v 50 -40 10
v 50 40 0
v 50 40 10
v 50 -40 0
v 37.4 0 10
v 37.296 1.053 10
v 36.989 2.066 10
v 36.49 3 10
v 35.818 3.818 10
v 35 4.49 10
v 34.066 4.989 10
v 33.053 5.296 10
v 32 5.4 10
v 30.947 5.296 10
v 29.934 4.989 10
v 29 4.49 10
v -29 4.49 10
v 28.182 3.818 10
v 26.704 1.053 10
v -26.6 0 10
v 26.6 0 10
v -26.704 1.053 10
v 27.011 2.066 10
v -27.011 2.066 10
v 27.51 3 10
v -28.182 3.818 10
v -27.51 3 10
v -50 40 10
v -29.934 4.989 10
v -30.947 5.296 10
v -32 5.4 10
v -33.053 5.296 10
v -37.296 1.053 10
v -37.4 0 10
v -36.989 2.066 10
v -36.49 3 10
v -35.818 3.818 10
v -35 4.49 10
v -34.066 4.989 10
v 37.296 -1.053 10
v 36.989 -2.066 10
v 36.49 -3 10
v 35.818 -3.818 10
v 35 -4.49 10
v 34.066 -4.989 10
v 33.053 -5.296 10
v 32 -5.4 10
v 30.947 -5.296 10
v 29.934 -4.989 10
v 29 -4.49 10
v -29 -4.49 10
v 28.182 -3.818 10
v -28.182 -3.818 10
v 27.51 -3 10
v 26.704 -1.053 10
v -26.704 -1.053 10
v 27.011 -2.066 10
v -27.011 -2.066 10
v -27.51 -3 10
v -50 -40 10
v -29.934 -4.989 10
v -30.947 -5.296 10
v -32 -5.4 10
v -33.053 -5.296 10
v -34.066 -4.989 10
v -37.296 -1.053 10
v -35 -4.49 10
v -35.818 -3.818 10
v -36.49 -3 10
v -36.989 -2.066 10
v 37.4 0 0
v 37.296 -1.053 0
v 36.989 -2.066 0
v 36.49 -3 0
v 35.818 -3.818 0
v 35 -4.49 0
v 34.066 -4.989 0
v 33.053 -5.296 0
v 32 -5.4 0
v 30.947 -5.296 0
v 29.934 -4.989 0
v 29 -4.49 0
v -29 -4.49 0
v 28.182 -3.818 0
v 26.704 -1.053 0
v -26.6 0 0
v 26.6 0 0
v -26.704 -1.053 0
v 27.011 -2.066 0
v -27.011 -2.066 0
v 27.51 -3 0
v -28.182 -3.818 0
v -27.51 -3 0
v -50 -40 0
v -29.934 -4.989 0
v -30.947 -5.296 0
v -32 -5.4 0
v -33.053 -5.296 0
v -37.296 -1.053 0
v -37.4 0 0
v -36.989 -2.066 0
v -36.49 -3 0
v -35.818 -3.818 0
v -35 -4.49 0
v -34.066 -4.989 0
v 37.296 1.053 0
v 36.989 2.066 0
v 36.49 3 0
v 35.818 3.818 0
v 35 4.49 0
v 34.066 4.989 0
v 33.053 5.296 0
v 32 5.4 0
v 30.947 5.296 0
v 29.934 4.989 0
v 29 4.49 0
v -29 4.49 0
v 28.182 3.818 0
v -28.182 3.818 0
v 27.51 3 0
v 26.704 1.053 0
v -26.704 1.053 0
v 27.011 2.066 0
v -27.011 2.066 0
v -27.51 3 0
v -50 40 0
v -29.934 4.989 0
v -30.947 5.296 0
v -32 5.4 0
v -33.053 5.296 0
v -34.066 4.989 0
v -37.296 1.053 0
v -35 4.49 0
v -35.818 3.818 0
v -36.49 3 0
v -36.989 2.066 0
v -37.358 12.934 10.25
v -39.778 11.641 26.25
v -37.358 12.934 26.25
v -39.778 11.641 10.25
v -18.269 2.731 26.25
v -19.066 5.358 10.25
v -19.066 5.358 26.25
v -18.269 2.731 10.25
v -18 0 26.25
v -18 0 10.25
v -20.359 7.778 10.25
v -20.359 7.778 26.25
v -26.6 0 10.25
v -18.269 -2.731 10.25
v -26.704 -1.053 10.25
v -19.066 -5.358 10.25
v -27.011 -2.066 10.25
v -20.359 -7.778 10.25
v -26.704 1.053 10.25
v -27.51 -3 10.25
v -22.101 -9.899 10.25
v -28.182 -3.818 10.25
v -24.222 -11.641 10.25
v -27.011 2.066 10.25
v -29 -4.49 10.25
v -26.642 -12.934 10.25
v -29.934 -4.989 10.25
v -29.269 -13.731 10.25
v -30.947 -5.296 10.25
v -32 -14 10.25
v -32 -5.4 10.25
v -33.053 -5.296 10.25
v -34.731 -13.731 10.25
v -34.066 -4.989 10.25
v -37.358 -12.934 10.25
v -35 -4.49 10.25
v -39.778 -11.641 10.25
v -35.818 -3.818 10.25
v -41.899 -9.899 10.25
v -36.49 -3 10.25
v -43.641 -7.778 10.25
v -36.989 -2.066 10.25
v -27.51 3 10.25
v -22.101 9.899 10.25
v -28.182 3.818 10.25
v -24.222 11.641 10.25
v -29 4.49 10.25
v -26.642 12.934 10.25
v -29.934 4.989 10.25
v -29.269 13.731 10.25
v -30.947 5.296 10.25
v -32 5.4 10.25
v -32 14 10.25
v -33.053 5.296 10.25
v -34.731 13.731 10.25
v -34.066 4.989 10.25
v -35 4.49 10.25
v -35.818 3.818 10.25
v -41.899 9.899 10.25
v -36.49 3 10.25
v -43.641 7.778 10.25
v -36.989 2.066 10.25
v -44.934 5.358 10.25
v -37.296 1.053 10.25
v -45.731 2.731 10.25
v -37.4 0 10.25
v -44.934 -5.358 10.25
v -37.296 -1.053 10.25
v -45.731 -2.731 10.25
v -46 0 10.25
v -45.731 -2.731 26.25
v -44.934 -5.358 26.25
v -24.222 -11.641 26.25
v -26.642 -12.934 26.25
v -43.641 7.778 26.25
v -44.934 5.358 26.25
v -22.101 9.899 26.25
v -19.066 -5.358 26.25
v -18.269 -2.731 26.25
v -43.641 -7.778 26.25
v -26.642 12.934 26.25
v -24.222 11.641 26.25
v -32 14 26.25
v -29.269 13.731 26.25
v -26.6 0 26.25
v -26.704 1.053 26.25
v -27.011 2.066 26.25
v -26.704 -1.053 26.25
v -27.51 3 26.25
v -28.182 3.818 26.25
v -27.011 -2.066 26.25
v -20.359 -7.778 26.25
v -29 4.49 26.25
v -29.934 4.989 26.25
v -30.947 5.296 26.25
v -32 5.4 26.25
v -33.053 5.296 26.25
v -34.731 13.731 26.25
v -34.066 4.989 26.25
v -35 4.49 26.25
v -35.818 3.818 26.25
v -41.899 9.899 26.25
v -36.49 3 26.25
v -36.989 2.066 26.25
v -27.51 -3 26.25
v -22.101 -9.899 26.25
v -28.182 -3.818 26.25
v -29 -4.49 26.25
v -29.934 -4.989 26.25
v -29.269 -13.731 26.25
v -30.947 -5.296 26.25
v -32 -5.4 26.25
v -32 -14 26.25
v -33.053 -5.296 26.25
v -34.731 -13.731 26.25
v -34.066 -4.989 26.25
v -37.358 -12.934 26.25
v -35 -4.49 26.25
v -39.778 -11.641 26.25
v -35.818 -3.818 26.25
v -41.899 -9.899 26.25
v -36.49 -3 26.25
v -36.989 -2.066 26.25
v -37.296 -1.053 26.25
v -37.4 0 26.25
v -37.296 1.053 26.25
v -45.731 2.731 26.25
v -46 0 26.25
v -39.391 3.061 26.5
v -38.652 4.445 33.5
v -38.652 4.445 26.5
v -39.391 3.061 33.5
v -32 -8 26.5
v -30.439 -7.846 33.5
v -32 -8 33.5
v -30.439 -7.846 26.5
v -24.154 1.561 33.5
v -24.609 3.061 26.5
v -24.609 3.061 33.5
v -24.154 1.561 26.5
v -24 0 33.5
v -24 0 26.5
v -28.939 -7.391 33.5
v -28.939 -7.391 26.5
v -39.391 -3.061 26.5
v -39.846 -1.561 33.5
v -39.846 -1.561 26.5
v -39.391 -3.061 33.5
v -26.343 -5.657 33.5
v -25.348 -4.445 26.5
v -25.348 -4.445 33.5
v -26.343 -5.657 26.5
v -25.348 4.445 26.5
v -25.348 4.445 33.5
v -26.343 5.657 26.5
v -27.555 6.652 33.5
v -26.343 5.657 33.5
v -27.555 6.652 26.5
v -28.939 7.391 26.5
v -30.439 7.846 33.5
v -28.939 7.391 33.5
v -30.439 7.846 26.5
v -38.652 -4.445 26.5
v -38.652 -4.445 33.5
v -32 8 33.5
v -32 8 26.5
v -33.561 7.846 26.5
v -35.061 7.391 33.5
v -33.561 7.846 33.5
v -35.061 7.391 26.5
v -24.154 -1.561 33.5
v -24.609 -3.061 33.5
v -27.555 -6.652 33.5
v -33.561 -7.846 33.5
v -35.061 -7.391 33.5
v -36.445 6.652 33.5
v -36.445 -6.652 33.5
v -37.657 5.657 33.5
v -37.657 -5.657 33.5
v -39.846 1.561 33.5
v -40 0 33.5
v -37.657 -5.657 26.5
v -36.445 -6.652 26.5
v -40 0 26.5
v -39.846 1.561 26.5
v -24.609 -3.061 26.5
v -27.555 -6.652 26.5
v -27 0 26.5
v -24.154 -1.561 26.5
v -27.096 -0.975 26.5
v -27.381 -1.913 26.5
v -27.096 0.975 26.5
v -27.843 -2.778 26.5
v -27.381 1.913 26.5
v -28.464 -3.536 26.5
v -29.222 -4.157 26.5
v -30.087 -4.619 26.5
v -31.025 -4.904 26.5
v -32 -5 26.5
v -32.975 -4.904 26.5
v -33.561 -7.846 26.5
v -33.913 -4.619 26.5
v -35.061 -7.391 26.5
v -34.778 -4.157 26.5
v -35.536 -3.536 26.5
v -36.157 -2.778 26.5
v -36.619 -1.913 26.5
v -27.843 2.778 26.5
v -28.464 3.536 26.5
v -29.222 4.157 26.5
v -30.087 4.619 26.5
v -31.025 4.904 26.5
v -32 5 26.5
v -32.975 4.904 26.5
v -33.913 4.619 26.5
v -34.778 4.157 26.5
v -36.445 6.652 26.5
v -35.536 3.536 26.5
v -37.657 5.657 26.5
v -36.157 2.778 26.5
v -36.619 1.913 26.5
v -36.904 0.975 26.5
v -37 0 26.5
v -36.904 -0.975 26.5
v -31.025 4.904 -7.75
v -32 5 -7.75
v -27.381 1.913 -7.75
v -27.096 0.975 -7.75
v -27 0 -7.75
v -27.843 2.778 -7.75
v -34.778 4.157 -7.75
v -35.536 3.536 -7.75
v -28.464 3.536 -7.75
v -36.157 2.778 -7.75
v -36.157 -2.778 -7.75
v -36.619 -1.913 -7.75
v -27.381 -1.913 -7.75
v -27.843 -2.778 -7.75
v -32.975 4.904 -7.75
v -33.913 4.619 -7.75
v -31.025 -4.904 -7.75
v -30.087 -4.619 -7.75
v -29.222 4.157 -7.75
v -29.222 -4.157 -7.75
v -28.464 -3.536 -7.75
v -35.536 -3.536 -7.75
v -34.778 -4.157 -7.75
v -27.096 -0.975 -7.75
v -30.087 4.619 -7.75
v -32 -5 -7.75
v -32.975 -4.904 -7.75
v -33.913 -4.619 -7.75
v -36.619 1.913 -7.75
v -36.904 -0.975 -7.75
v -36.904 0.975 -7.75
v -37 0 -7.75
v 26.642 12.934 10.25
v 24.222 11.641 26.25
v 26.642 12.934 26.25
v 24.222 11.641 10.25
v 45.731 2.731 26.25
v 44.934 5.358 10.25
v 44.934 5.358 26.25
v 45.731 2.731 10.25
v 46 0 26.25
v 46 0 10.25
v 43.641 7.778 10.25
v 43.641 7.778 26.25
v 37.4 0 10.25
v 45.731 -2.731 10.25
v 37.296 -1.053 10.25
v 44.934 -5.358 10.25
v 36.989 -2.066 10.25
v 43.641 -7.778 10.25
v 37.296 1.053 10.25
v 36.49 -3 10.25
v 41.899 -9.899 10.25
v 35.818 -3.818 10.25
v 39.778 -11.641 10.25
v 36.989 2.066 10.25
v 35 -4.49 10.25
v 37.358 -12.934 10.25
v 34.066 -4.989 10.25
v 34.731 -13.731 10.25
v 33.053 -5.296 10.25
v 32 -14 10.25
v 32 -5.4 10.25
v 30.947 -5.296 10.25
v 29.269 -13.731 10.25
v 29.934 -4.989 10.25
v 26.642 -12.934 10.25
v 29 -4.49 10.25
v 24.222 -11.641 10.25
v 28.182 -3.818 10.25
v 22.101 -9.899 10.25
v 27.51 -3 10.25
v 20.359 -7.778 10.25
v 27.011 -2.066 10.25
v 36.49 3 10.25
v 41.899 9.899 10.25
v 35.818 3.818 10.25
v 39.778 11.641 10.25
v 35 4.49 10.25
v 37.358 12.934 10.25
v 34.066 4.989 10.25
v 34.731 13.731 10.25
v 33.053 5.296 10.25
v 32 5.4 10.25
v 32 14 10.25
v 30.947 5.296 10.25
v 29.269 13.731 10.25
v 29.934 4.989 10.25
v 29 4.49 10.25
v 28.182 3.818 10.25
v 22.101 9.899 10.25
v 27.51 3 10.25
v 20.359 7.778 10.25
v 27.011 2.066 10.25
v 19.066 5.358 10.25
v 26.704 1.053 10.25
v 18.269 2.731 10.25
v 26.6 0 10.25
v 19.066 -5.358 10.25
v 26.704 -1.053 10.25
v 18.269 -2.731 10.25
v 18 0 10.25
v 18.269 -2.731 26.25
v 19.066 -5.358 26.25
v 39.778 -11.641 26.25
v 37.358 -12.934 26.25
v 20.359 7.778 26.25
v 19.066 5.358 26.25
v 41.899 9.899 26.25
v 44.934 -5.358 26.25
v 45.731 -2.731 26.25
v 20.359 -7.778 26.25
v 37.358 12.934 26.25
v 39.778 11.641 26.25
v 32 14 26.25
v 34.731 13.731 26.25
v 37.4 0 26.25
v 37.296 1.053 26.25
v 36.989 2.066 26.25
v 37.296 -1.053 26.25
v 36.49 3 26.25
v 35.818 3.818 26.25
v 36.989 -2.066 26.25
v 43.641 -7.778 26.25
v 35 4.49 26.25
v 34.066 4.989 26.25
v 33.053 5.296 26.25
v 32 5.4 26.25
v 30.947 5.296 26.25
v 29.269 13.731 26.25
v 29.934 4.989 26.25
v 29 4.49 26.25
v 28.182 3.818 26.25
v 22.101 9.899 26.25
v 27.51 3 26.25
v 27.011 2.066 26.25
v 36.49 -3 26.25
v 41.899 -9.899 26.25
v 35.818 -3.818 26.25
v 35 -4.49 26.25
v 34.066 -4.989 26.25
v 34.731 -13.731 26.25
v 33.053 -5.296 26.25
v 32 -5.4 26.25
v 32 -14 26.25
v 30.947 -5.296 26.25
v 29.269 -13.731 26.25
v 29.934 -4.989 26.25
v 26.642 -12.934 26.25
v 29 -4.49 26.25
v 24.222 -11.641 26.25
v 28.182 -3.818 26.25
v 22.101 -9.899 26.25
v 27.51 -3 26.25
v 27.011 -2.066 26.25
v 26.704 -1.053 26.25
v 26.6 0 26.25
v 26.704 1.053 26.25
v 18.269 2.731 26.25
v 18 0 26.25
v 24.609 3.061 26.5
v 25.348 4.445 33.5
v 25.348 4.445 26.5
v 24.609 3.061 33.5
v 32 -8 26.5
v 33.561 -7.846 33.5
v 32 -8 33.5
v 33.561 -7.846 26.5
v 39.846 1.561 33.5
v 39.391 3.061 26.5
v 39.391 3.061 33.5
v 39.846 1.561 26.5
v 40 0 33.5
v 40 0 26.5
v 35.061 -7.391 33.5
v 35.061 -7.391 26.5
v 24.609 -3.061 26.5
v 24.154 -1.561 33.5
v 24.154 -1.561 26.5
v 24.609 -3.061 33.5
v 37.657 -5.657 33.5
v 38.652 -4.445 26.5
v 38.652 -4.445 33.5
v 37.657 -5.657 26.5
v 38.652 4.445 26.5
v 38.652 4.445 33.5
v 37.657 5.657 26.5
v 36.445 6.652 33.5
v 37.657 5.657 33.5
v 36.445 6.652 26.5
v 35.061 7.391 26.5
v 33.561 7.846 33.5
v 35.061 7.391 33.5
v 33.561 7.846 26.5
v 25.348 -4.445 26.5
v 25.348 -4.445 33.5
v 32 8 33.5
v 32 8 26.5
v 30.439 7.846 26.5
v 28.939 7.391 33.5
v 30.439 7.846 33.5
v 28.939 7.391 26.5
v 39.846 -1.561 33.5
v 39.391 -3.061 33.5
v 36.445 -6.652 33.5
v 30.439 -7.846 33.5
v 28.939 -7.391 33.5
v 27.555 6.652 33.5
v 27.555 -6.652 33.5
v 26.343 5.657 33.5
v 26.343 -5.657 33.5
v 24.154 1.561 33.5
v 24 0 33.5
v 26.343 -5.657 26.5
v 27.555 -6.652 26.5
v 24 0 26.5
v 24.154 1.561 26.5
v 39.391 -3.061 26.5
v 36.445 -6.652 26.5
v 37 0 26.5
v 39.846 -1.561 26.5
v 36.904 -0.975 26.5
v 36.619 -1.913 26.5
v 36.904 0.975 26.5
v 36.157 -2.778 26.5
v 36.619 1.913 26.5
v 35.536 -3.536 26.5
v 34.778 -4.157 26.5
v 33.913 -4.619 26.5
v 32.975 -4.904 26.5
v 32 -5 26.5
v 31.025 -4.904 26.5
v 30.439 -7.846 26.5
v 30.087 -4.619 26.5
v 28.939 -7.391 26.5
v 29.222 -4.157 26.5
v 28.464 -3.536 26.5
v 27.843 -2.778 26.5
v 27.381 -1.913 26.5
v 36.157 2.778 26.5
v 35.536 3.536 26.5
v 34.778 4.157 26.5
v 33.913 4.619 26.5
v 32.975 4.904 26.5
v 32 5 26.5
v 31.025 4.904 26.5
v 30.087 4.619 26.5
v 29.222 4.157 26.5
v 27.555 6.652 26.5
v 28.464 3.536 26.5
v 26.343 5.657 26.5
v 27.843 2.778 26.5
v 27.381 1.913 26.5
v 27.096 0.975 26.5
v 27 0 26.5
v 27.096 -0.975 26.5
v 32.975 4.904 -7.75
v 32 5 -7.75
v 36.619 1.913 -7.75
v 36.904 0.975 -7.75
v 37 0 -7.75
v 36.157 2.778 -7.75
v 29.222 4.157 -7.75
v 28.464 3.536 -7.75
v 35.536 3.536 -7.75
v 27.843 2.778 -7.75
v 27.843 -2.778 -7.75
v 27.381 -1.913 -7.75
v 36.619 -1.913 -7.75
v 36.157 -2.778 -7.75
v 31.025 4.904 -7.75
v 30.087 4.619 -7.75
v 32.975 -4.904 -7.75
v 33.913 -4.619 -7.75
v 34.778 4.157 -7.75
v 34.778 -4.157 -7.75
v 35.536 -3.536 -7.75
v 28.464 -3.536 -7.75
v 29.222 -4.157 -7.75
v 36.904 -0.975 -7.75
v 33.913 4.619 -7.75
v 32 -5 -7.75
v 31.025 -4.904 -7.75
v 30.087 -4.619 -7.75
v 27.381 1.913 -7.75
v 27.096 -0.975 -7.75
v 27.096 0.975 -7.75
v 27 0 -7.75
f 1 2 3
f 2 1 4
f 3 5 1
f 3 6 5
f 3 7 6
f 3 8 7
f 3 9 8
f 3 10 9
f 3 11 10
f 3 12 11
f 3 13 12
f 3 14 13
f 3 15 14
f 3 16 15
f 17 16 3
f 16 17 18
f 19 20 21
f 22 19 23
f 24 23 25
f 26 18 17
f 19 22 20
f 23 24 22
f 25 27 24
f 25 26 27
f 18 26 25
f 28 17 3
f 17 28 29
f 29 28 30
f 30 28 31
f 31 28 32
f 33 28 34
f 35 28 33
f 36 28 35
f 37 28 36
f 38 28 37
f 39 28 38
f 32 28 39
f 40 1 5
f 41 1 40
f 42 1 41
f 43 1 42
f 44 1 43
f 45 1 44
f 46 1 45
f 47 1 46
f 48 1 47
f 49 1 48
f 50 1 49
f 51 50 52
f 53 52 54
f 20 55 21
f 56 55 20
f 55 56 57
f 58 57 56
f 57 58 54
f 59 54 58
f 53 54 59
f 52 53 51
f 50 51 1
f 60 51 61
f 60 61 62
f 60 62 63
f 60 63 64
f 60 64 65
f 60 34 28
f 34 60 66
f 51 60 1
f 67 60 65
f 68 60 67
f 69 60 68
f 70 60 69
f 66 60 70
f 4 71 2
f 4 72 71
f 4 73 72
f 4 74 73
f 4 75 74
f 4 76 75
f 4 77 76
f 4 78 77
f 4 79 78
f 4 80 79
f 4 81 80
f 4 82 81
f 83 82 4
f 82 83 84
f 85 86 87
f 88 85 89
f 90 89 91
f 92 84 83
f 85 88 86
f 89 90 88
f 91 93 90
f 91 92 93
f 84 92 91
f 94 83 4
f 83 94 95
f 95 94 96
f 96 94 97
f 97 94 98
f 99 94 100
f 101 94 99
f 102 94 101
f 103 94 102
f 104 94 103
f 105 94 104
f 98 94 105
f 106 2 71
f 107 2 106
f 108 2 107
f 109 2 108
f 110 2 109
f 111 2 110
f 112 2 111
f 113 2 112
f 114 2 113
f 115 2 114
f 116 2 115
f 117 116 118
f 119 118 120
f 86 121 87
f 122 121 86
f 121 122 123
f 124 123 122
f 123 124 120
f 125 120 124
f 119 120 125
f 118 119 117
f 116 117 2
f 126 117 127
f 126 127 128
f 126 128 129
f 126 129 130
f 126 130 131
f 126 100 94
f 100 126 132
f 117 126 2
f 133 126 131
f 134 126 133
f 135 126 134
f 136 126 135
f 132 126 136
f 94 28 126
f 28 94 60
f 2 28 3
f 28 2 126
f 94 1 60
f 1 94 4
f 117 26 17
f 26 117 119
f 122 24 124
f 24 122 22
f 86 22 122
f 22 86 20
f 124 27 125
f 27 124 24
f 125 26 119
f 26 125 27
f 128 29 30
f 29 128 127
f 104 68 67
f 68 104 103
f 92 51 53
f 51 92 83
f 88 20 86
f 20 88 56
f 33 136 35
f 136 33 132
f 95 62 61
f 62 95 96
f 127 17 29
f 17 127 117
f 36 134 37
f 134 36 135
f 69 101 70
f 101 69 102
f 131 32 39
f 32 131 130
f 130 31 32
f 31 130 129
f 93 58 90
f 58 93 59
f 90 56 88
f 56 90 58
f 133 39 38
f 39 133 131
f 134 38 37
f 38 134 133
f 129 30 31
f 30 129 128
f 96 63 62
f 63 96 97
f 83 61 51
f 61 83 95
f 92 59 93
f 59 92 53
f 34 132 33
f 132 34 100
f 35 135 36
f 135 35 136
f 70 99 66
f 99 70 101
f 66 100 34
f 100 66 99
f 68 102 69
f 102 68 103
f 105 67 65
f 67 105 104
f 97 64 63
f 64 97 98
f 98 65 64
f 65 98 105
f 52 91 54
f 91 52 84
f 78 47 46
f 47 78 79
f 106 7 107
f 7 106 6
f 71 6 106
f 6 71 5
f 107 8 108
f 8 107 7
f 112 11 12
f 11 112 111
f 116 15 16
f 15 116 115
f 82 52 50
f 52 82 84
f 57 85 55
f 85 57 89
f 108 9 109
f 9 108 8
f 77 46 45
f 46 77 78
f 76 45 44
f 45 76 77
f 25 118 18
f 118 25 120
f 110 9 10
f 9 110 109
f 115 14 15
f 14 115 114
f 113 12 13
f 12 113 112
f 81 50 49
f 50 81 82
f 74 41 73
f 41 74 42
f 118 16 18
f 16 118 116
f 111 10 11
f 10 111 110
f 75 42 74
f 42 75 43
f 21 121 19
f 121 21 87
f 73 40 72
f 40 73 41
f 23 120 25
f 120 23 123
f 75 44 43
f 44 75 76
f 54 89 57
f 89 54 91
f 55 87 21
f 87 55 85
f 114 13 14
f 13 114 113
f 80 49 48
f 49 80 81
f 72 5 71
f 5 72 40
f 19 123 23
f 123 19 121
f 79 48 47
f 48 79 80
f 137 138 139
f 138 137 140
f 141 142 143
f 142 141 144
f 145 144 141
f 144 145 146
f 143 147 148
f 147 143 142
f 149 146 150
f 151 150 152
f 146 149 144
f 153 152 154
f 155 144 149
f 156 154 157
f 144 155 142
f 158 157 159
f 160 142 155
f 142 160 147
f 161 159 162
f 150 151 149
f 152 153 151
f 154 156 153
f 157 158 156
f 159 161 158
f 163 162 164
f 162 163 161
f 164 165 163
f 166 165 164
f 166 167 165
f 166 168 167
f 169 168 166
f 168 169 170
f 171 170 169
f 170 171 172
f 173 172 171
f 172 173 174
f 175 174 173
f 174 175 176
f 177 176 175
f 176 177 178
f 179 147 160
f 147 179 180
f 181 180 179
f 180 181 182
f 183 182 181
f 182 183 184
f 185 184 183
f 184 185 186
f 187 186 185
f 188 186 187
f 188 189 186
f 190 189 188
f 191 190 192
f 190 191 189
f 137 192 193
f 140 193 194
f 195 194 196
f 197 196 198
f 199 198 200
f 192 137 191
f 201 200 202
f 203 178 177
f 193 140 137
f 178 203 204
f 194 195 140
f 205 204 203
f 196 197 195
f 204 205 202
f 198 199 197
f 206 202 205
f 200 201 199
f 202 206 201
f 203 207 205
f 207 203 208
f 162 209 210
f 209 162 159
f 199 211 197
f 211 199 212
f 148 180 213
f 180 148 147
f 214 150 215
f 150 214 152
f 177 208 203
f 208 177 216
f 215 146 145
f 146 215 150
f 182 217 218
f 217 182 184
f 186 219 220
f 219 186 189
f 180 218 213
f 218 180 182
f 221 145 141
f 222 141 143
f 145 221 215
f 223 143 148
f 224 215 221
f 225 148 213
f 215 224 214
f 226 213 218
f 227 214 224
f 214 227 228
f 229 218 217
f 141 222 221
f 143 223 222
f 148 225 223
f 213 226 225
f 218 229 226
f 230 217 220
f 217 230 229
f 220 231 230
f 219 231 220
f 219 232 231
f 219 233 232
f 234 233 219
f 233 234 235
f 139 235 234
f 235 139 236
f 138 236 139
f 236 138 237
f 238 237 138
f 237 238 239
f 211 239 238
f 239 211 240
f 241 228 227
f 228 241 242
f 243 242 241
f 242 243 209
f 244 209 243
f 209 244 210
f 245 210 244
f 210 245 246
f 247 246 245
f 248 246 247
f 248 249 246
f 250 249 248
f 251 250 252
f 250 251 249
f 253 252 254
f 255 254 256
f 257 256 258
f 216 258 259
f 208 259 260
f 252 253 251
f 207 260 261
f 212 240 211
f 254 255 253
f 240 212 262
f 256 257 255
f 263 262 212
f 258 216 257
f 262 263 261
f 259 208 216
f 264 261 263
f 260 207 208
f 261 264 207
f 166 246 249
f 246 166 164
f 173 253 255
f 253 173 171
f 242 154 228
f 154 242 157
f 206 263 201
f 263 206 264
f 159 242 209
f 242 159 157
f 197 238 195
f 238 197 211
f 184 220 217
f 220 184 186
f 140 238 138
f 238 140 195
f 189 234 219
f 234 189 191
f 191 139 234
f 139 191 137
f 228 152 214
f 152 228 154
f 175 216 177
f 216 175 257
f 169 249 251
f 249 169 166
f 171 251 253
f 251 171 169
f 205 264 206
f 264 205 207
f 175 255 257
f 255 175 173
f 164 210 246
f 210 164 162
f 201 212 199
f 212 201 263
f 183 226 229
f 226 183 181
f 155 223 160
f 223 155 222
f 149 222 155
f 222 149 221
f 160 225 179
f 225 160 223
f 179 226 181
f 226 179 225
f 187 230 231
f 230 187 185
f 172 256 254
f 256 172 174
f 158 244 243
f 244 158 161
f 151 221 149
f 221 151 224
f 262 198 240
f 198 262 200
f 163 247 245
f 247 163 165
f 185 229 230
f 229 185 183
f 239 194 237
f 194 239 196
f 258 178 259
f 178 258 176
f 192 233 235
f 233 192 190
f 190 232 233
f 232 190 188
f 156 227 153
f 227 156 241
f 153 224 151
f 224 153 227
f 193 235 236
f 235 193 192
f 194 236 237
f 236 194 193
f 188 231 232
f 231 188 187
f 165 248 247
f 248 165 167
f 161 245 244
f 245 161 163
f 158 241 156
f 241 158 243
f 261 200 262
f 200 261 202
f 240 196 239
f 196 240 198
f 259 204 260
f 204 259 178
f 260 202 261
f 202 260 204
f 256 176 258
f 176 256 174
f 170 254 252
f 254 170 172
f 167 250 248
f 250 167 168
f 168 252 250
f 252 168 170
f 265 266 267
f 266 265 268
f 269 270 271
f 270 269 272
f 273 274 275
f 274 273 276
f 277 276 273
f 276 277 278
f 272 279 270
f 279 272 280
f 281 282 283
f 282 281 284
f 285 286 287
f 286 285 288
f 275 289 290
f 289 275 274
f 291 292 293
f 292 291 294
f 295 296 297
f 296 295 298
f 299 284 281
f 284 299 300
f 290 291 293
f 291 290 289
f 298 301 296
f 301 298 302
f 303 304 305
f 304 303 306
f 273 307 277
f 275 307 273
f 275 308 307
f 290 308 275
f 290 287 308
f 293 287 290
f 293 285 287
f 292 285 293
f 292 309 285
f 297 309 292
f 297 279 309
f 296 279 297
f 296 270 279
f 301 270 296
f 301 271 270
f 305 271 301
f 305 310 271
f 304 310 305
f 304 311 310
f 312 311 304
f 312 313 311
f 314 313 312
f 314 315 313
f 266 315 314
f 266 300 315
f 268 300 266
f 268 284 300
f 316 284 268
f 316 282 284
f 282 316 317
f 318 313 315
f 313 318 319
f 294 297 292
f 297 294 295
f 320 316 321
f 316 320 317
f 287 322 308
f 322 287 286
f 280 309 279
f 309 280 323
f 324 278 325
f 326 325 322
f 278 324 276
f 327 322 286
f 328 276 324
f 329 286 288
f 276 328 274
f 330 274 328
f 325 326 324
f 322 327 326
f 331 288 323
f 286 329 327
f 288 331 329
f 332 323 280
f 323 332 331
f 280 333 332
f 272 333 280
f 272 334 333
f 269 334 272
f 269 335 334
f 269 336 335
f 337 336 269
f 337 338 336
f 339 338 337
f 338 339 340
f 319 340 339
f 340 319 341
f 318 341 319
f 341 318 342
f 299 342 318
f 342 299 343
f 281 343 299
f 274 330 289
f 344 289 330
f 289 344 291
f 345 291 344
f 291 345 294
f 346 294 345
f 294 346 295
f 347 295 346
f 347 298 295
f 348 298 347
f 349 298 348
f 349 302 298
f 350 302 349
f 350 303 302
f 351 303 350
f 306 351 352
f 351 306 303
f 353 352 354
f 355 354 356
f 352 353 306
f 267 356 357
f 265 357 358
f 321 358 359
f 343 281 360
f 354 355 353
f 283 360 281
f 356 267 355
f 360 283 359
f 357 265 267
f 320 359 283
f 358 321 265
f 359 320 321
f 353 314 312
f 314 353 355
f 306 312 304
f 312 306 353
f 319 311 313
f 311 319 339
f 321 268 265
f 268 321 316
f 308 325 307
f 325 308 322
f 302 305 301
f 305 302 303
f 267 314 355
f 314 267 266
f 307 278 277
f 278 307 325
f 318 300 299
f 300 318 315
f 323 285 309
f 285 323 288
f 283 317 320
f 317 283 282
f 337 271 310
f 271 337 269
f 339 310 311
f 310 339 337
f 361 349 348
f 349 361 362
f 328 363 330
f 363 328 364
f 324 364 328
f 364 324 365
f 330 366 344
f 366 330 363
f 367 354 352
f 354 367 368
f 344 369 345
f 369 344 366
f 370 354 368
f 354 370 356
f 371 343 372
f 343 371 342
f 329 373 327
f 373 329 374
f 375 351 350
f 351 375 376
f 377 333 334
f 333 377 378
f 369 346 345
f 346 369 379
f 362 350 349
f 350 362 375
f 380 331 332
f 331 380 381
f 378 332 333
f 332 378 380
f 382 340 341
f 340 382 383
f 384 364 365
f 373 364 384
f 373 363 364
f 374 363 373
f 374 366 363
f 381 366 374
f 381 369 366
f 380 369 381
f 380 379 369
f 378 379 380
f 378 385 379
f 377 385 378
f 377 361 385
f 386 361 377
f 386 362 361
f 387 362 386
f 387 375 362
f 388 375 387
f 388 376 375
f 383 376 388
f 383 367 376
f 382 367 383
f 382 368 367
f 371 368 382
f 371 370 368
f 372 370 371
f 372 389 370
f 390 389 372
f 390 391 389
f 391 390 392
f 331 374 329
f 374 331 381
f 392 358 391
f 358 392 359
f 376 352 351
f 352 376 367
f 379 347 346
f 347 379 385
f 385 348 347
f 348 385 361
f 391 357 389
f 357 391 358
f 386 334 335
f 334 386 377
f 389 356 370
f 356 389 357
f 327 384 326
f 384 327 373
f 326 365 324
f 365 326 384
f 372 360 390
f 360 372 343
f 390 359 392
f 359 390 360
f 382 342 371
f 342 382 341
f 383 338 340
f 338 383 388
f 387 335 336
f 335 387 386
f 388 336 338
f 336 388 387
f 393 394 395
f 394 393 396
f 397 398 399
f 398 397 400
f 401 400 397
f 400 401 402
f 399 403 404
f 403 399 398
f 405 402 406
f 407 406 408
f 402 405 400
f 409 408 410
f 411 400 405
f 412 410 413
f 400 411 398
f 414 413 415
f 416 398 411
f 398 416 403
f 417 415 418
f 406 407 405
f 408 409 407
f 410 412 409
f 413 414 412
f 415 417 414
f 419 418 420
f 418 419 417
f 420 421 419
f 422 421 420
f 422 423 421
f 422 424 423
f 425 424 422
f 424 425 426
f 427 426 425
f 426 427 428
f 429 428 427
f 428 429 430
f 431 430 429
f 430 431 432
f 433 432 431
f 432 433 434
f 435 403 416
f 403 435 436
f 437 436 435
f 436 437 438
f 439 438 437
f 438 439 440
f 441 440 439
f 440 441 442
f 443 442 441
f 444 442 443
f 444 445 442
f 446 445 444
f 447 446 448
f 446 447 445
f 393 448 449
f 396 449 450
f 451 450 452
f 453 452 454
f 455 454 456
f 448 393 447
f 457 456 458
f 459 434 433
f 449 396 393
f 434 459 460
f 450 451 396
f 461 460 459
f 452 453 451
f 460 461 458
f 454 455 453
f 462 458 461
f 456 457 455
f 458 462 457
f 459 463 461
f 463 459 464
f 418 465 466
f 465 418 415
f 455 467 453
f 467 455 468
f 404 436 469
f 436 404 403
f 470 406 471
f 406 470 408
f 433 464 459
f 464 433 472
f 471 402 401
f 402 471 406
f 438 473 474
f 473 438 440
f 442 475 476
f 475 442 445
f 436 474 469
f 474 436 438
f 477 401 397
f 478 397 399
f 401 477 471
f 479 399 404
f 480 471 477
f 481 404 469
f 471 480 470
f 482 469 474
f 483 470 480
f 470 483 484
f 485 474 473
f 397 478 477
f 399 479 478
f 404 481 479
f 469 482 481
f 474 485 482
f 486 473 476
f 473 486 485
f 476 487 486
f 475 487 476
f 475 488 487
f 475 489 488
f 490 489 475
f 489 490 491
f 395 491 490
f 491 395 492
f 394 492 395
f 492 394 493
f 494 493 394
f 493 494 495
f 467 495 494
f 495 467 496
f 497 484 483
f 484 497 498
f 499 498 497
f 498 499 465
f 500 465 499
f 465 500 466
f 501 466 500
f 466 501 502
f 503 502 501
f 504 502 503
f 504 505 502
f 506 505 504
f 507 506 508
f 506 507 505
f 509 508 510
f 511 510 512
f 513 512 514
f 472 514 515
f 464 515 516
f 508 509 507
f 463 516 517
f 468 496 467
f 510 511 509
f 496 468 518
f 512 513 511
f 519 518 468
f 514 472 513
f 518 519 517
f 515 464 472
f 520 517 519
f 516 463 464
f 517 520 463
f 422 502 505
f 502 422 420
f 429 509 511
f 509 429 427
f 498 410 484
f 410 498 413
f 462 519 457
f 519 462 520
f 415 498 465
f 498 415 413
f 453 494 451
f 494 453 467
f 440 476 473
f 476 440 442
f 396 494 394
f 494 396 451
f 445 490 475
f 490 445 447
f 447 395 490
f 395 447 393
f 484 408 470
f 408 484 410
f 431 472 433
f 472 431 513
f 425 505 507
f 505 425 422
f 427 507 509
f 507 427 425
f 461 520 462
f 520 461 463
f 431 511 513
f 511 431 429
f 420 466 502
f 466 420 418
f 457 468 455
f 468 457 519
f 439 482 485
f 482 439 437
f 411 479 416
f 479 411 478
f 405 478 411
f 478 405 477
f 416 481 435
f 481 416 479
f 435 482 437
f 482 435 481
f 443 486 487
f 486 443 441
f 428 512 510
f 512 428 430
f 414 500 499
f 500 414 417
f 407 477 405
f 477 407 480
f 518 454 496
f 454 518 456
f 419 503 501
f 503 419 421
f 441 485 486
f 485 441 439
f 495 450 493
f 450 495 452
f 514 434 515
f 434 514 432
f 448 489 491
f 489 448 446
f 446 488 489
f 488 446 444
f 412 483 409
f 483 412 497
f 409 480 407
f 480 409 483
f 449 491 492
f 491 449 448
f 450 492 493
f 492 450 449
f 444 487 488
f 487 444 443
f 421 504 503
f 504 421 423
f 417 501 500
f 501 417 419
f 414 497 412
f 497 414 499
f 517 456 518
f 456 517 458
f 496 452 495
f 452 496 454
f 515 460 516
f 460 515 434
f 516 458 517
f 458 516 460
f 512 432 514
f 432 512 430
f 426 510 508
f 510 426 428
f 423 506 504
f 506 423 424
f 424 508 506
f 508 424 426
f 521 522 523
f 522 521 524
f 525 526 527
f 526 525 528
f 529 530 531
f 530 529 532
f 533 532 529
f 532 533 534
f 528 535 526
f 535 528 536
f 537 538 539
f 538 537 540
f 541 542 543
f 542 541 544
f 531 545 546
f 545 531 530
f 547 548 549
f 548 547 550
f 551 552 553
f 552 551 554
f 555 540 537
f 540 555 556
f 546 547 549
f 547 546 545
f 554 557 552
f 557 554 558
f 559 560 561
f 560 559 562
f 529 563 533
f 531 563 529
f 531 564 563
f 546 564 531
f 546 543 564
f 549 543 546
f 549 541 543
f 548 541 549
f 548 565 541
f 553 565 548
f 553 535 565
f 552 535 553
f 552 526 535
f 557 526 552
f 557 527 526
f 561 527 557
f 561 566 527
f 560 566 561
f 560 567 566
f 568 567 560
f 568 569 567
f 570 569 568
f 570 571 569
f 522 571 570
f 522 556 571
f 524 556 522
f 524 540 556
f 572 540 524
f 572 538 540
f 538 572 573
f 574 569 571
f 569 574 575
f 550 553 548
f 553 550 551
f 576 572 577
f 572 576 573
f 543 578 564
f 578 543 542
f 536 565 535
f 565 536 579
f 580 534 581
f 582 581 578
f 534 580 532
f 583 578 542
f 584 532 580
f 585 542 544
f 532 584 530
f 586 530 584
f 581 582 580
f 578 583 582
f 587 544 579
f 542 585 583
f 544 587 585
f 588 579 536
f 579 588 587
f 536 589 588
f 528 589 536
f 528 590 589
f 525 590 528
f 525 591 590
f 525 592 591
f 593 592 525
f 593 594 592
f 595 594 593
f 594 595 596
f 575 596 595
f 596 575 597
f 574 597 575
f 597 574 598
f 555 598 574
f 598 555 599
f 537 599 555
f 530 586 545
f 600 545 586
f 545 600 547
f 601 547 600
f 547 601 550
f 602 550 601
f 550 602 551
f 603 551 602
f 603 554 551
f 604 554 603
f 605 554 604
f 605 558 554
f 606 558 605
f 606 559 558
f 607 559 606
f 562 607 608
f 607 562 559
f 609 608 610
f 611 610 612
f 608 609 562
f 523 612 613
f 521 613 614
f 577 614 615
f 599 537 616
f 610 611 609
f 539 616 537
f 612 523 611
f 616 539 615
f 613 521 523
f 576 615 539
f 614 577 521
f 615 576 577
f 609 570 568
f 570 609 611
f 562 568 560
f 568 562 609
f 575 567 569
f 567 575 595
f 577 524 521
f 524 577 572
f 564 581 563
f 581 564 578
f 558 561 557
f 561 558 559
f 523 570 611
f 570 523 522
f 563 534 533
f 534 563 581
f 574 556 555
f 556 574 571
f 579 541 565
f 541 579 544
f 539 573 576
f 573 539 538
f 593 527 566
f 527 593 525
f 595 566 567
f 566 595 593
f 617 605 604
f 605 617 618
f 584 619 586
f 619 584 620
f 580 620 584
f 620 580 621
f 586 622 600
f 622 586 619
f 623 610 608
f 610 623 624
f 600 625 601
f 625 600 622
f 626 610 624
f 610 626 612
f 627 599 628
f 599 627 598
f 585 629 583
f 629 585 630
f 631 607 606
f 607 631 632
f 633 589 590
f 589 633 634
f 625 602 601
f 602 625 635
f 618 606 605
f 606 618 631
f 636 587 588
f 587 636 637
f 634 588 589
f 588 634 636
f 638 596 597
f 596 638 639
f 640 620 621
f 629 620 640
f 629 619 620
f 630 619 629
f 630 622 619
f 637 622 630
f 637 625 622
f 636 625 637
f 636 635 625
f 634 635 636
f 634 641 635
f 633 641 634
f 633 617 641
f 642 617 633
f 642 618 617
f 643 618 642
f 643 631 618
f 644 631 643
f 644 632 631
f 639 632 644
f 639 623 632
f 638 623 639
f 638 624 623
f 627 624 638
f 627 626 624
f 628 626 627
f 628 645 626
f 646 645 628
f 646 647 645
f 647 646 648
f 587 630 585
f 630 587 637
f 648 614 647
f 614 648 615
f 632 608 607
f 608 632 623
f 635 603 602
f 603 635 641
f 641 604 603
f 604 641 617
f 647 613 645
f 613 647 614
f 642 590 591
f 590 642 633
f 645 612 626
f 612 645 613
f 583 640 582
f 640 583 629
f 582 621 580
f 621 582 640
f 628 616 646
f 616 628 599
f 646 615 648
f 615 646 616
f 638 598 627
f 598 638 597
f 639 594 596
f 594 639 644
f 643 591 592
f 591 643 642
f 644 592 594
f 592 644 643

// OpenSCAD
$fn = 32;

// ------------------------------------------------------------------------
// Standoff columns: 2 d28 standoffs, bolts d10
// Every part is its own module, assembly() places them once.
// ------------------------------------------------------------------------

// --- part 1 ---
module base_plate() {
  difference() {
    translate([-50, -40, 0]) cube([100, 80, 10]);
    translate([-32, 0, -1]) cylinder(h = 12, d = 10.8);
    translate([32, 0, -1]) cylinder(h = 12, d = 10.8);
  }
}

// --- part 2 ---
module spacer1() {
  difference() {
      translate([0, 0, 0]) cylinder(h = 16, d = 28);
      translate([0, 0, -1]) cylinder(h = 18, d = 10.8);
    }
}

// --- part 3 ---
module bolt1() {
  cylinder(h = 7, d = 16);
  translate([0, 0, -34.25]) cylinder(h = 34.25, d = 10);
}

// --- part 4 ---
module spacer2() {
  difference() {
      translate([0, 0, 0]) cylinder(h = 16, d = 28);
      translate([0, 0, -1]) cylinder(h = 18, d = 10.8);
    }
}

// --- part 5 ---
module bolt2() {
  cylinder(h = 7, d = 16);
  translate([0, 0, -34.25]) cylinder(h = 34.25, d = 10);
}

// --- assembly ---
module assembly() {
  translate([0, 0, 0]) rotate([0, 0, 0]) base_plate();
  translate([-32, 0, 10.25]) rotate([0, 0, 0]) spacer1();
  translate([-32, 0, 26.5]) rotate([0, 0, 0]) bolt1();
  translate([32, 0, 10.25]) rotate([0, 0, 0]) spacer2();
  translate([32, 0, 26.5]) rotate([0, 0, 0]) bolt2();
}

assembly();
